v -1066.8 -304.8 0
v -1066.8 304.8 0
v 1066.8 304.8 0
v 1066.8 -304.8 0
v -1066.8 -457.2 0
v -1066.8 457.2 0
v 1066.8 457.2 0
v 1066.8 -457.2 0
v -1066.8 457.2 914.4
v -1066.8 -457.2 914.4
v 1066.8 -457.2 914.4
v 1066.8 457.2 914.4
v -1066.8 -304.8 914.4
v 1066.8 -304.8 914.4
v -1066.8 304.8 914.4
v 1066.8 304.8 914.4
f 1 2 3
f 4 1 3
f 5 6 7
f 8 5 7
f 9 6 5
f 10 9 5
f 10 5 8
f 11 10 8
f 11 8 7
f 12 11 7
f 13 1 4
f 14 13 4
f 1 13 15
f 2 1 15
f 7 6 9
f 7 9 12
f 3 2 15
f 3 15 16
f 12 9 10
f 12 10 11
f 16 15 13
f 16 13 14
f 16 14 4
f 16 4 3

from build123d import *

# Parameters (mm, degrees)
F0_W     = 2133.6
F0_H     = 609.6
F1_DEPTH = 914.4
F0_H_2   = 152.4
F2_DEPTH = 914.4


with BuildPart() as f1:
    # F0 (on Top) → F1 (new body)
    with BuildSketch(Plane.XY):
        Rectangle(F0_W, F0_H)
    extrude(amount=F1_DEPTH)


with BuildPart() as f2:
    # F0 (on Top) → F2 (new body)
    with BuildSketch(Plane.XY):
        with Locations((0, 381)):
            Rectangle(F0_W, F0_H_2)
        Rectangle(F0_W, F0_H)
        with Locations((0, -381)):
            Rectangle(F0_W, F0_H_2)
    extrude(amount=F2_DEPTH)


solid = Compound([f1.part, f2.part])
